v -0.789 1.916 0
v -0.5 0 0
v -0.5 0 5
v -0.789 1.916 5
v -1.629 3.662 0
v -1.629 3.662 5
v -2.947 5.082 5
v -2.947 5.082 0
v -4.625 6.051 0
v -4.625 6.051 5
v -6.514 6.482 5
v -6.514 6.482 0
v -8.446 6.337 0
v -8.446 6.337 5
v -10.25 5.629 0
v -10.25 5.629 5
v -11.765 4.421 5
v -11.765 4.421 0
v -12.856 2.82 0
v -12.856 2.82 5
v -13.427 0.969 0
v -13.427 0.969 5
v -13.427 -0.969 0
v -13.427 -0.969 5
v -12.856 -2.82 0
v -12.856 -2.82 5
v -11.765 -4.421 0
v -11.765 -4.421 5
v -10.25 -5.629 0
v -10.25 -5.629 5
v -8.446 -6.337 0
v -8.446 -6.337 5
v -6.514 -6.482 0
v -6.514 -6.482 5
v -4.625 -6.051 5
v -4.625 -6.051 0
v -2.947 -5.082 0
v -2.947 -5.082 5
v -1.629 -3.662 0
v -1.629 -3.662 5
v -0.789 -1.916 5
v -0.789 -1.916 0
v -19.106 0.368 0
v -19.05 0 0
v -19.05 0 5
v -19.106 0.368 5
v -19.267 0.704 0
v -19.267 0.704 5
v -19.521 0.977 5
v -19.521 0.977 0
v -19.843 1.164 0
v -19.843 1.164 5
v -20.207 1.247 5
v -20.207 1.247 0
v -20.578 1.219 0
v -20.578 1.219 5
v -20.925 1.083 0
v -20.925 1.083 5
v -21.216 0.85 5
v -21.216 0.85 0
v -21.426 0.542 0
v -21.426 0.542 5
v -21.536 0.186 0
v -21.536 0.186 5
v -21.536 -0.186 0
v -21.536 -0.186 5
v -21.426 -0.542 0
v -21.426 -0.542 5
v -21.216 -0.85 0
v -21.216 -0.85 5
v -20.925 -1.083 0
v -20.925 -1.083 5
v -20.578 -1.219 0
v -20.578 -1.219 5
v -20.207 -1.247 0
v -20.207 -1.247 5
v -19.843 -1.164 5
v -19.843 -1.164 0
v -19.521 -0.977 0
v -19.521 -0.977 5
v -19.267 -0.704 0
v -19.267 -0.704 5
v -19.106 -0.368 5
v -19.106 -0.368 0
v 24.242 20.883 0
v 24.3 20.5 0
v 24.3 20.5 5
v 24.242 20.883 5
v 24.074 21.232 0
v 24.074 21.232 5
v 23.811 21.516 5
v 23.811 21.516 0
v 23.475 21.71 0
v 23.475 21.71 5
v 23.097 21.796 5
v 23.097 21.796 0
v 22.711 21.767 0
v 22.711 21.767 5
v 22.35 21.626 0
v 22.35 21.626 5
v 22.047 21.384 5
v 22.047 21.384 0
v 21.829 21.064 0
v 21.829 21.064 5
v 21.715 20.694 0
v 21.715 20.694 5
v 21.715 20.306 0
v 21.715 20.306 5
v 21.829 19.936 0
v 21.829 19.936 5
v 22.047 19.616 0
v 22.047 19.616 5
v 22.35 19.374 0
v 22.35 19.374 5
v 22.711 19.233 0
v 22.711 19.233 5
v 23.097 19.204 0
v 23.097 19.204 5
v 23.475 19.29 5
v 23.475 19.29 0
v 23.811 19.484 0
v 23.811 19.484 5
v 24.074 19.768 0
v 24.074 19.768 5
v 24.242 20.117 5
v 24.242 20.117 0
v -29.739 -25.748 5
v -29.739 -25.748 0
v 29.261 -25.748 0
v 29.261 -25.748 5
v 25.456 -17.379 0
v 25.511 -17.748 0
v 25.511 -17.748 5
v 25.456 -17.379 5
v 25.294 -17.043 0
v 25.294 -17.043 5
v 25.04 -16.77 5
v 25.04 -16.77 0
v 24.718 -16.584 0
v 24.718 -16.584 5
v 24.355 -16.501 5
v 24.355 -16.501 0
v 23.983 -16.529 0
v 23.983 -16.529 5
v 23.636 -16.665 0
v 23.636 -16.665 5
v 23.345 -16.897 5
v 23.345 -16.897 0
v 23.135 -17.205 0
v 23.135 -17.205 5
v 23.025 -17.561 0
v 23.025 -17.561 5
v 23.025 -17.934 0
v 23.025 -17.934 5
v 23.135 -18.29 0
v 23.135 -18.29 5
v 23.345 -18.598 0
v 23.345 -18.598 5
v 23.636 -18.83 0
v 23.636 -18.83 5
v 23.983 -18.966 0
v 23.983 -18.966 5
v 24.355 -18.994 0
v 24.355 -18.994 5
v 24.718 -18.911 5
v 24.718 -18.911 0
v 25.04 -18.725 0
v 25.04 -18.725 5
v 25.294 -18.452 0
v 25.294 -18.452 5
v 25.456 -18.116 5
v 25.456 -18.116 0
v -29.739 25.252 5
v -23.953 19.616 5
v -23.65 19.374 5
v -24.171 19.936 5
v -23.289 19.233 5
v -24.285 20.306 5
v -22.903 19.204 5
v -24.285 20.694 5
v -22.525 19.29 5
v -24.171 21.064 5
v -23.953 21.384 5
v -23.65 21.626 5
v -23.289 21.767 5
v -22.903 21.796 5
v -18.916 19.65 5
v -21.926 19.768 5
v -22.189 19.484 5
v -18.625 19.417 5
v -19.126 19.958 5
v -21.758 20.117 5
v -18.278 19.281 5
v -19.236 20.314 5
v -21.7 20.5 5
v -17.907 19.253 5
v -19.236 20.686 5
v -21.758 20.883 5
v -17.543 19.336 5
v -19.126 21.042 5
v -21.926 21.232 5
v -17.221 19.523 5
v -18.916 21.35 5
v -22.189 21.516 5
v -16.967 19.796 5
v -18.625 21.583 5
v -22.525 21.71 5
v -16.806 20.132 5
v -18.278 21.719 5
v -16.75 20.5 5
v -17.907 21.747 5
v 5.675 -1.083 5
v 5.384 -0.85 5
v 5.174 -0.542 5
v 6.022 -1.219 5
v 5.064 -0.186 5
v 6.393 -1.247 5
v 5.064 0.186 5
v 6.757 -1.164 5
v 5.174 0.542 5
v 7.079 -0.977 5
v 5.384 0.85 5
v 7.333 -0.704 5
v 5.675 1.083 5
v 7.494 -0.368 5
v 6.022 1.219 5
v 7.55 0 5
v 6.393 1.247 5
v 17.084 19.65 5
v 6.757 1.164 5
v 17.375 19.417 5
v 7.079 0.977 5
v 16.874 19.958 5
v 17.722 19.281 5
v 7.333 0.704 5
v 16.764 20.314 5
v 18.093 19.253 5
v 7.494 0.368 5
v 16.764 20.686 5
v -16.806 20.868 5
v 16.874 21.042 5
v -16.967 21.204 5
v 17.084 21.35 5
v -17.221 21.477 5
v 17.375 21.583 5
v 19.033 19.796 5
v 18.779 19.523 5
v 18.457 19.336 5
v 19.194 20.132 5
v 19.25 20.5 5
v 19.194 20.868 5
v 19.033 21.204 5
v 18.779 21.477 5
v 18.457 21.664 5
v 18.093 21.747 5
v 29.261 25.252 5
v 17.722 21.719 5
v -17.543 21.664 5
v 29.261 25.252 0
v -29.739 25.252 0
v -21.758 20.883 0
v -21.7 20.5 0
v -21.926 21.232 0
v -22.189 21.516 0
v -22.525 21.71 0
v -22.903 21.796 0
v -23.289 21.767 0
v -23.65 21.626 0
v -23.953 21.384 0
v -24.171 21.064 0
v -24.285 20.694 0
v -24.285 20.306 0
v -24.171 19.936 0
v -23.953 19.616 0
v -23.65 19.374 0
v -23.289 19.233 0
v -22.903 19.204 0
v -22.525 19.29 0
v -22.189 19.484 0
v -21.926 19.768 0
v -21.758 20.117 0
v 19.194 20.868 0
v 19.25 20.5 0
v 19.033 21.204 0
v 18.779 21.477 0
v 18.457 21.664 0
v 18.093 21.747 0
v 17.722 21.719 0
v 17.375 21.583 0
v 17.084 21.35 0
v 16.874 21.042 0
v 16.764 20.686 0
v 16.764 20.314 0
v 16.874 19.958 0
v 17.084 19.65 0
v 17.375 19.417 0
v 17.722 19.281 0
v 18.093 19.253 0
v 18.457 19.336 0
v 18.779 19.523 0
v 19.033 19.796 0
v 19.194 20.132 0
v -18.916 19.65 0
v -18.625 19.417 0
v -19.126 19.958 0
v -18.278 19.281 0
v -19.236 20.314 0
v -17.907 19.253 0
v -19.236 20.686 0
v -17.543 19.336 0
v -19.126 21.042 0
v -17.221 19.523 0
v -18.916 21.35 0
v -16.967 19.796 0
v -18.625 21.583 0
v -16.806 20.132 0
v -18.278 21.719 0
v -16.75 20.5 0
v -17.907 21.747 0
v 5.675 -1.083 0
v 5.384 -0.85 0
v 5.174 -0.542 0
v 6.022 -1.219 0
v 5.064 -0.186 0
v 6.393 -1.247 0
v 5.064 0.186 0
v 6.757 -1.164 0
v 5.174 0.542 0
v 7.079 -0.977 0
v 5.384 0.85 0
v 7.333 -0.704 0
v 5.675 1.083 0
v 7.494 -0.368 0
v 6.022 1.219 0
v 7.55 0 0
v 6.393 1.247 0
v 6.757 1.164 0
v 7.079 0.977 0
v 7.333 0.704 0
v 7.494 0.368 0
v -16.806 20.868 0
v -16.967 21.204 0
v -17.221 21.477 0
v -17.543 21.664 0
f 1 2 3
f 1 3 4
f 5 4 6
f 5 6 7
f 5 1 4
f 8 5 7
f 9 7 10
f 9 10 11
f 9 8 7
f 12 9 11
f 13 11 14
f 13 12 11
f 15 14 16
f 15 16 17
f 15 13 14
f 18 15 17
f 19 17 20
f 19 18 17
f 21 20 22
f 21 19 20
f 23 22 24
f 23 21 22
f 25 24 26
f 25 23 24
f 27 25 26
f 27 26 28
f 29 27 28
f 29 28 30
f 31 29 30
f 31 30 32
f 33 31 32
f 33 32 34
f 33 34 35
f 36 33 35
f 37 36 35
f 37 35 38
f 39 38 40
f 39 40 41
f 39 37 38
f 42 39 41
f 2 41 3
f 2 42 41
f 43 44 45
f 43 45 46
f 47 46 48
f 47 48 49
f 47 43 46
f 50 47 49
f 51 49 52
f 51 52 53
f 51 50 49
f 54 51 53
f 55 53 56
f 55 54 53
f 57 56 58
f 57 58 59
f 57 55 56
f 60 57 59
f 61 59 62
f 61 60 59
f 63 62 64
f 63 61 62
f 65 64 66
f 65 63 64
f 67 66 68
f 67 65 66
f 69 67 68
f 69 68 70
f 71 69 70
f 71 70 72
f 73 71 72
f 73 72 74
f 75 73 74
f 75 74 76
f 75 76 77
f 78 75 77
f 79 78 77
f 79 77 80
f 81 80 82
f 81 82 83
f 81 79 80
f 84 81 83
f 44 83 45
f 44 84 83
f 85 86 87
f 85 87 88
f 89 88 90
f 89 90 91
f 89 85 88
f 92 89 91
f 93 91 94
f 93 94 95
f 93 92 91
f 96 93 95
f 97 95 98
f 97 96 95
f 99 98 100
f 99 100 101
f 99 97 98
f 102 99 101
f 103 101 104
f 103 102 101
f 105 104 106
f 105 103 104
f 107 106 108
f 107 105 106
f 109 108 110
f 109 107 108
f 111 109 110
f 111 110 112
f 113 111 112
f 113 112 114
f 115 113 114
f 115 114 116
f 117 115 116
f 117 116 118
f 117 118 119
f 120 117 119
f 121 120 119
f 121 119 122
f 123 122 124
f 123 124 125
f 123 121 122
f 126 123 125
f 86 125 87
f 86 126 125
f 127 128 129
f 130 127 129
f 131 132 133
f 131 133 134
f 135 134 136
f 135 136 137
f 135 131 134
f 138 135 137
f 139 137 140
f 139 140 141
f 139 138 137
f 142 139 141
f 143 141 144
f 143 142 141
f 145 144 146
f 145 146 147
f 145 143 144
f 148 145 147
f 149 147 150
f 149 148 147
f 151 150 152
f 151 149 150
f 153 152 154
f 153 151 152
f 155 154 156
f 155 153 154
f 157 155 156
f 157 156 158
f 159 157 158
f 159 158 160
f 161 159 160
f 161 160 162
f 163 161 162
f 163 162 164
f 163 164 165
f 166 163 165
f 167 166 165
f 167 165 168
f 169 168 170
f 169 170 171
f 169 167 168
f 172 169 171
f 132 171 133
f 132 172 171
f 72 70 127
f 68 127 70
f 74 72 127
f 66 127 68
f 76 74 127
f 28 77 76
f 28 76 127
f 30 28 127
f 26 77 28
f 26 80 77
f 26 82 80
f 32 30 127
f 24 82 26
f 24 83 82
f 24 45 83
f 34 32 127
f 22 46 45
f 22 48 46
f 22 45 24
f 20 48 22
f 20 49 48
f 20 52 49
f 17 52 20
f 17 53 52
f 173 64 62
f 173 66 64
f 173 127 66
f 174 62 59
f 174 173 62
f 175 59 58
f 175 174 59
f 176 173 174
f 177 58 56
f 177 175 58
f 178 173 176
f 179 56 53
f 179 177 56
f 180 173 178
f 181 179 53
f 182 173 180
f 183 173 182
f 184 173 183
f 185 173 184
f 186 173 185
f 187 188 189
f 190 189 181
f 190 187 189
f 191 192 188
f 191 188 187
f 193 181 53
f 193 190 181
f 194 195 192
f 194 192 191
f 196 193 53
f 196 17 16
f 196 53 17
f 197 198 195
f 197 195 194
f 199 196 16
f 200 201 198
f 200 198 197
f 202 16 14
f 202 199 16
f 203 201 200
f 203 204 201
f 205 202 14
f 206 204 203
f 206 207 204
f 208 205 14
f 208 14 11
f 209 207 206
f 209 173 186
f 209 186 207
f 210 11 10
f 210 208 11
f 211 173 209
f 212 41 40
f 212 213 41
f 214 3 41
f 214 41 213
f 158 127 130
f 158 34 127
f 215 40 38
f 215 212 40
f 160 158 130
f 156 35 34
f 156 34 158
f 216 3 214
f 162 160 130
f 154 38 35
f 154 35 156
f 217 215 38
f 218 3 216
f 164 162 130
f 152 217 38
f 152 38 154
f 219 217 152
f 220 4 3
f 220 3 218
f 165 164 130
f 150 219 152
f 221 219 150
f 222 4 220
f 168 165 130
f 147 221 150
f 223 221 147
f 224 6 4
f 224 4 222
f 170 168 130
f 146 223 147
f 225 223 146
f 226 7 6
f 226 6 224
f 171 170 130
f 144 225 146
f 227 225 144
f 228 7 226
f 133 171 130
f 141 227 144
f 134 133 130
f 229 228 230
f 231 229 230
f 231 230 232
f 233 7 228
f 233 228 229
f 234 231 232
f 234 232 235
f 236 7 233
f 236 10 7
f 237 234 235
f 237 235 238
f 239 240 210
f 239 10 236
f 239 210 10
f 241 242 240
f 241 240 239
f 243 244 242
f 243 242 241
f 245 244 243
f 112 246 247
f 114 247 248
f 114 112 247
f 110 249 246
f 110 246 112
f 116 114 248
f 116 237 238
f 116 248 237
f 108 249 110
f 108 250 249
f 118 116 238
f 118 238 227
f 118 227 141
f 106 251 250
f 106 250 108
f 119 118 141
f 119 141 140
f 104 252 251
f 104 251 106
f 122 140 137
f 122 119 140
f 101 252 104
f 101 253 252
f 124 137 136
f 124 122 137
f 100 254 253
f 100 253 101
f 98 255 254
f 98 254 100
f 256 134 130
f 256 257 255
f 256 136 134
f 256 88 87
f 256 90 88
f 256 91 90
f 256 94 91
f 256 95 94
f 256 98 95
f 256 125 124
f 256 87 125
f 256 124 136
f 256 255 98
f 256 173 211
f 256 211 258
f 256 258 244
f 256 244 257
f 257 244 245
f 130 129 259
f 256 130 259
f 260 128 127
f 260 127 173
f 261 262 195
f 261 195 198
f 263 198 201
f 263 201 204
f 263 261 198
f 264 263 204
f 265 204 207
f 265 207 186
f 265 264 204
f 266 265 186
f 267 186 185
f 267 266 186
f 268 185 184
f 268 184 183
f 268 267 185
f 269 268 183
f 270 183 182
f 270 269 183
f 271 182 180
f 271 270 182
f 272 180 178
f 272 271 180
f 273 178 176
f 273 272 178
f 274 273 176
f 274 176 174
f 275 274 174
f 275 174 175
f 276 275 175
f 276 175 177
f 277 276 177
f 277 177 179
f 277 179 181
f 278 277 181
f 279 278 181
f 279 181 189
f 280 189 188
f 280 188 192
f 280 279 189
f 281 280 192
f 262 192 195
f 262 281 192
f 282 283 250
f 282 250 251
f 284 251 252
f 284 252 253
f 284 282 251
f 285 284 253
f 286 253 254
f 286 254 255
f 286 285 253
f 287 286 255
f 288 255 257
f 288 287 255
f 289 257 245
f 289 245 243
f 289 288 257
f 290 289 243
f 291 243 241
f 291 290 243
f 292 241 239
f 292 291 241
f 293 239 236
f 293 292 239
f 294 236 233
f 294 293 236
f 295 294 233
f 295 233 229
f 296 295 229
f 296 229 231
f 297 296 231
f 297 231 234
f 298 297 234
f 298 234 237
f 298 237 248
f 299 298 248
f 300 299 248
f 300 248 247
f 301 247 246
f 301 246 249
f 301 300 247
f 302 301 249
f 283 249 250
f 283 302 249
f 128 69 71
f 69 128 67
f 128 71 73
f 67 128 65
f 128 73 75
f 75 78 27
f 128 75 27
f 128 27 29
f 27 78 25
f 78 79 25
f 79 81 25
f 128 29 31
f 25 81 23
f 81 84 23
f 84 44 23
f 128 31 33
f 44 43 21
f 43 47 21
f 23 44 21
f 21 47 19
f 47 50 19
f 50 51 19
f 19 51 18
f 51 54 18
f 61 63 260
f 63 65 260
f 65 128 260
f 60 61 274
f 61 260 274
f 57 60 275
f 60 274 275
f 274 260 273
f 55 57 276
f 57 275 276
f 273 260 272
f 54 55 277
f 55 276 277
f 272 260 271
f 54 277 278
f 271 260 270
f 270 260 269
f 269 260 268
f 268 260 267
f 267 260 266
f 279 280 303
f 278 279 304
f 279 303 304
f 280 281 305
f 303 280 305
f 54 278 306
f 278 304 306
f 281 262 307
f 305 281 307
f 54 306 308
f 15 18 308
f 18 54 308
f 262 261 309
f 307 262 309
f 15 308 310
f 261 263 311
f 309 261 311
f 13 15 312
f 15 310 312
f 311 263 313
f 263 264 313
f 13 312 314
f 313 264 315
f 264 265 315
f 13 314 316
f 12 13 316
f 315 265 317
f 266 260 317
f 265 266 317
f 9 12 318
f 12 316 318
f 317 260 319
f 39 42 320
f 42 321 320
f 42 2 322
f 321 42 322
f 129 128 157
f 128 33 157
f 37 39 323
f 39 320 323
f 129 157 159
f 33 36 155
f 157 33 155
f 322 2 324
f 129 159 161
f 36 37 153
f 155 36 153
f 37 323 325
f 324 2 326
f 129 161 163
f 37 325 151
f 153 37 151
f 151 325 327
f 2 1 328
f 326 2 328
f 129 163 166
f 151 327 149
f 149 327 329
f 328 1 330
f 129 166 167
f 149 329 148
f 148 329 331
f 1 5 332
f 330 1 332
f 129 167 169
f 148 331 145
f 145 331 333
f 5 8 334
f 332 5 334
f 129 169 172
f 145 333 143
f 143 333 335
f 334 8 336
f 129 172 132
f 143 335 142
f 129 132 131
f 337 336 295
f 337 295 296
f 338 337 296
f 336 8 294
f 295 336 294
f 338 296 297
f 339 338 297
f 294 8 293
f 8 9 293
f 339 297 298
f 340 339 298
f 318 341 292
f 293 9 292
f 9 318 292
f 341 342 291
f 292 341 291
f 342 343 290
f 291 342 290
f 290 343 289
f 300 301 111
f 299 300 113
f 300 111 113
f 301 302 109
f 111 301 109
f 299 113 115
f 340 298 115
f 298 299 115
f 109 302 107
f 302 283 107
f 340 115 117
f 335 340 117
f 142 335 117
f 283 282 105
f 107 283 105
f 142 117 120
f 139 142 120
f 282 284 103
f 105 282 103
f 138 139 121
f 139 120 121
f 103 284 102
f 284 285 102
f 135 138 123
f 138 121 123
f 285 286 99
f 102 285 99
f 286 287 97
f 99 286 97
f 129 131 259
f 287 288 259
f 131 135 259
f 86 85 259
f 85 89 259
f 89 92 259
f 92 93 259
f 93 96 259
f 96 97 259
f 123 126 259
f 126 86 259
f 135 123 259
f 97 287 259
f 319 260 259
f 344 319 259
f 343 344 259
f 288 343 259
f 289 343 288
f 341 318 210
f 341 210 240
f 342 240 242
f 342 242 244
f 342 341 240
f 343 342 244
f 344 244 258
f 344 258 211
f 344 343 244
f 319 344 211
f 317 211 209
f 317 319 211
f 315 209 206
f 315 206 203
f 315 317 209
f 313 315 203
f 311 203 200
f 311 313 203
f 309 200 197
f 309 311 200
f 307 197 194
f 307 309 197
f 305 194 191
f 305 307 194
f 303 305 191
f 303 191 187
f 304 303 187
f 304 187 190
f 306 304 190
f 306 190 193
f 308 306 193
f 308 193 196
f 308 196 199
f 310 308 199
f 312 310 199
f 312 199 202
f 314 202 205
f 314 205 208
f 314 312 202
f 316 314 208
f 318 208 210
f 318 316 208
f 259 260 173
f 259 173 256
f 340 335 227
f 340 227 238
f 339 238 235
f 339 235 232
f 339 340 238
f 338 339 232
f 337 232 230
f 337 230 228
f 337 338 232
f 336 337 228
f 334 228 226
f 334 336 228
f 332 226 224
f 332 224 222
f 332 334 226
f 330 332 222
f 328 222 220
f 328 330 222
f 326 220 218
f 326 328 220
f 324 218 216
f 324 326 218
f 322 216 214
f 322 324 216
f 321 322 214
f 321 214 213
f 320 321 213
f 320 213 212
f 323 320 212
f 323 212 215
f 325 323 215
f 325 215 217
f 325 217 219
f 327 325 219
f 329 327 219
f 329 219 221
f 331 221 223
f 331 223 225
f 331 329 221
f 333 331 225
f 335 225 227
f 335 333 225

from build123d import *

# Parameters (mm, degrees)
CROQUIS1_W              = 59
CROQUIS1_H              = 51
CROQUIS1_R              = 1.25
CROQUIS1_R_2            = 1.3
CROQUIS1_R_3            = 6.5
SALIENTE_EXTRUIR1_DEPTH = 5


with BuildPart() as part:
    # Croquis1 → Saliente-Extruir1 (new body)
    with BuildSketch(Plane.XY):
        with Locations((-0.238863052, -0.247607665)):
            Rectangle(CROQUIS1_W, CROQUIS1_H)
        with Locations((24.261136948, -17.747607665)):
            Circle(CROQUIS1_R, mode=Mode.SUBTRACT)
        with Locations((-18, 20.5)):
            Circle(CROQUIS1_R, mode=Mode.SUBTRACT)
        with Locations((18, 20.5)):
            Circle(CROQUIS1_R, mode=Mode.SUBTRACT)
        with Locations((-23, 20.5)):
            Circle(CROQUIS1_R_2, mode=Mode.SUBTRACT)
        with Locations((23, 20.5)):
            Circle(CROQUIS1_R_2, mode=Mode.SUBTRACT)
        with Locations((-7, 0)):
            Circle(CROQUIS1_R_3, mode=Mode.SUBTRACT)
        with Locations((-20.3, 0)):
            Circle(CROQUIS1_R, mode=Mode.SUBTRACT)
        with Locations((6.3, 0)):
            Circle(CROQUIS1_R, mode=Mode.SUBTRACT)
    extrude(amount=SALIENTE_EXTRUIR1_DEPTH)


solid = part.part
